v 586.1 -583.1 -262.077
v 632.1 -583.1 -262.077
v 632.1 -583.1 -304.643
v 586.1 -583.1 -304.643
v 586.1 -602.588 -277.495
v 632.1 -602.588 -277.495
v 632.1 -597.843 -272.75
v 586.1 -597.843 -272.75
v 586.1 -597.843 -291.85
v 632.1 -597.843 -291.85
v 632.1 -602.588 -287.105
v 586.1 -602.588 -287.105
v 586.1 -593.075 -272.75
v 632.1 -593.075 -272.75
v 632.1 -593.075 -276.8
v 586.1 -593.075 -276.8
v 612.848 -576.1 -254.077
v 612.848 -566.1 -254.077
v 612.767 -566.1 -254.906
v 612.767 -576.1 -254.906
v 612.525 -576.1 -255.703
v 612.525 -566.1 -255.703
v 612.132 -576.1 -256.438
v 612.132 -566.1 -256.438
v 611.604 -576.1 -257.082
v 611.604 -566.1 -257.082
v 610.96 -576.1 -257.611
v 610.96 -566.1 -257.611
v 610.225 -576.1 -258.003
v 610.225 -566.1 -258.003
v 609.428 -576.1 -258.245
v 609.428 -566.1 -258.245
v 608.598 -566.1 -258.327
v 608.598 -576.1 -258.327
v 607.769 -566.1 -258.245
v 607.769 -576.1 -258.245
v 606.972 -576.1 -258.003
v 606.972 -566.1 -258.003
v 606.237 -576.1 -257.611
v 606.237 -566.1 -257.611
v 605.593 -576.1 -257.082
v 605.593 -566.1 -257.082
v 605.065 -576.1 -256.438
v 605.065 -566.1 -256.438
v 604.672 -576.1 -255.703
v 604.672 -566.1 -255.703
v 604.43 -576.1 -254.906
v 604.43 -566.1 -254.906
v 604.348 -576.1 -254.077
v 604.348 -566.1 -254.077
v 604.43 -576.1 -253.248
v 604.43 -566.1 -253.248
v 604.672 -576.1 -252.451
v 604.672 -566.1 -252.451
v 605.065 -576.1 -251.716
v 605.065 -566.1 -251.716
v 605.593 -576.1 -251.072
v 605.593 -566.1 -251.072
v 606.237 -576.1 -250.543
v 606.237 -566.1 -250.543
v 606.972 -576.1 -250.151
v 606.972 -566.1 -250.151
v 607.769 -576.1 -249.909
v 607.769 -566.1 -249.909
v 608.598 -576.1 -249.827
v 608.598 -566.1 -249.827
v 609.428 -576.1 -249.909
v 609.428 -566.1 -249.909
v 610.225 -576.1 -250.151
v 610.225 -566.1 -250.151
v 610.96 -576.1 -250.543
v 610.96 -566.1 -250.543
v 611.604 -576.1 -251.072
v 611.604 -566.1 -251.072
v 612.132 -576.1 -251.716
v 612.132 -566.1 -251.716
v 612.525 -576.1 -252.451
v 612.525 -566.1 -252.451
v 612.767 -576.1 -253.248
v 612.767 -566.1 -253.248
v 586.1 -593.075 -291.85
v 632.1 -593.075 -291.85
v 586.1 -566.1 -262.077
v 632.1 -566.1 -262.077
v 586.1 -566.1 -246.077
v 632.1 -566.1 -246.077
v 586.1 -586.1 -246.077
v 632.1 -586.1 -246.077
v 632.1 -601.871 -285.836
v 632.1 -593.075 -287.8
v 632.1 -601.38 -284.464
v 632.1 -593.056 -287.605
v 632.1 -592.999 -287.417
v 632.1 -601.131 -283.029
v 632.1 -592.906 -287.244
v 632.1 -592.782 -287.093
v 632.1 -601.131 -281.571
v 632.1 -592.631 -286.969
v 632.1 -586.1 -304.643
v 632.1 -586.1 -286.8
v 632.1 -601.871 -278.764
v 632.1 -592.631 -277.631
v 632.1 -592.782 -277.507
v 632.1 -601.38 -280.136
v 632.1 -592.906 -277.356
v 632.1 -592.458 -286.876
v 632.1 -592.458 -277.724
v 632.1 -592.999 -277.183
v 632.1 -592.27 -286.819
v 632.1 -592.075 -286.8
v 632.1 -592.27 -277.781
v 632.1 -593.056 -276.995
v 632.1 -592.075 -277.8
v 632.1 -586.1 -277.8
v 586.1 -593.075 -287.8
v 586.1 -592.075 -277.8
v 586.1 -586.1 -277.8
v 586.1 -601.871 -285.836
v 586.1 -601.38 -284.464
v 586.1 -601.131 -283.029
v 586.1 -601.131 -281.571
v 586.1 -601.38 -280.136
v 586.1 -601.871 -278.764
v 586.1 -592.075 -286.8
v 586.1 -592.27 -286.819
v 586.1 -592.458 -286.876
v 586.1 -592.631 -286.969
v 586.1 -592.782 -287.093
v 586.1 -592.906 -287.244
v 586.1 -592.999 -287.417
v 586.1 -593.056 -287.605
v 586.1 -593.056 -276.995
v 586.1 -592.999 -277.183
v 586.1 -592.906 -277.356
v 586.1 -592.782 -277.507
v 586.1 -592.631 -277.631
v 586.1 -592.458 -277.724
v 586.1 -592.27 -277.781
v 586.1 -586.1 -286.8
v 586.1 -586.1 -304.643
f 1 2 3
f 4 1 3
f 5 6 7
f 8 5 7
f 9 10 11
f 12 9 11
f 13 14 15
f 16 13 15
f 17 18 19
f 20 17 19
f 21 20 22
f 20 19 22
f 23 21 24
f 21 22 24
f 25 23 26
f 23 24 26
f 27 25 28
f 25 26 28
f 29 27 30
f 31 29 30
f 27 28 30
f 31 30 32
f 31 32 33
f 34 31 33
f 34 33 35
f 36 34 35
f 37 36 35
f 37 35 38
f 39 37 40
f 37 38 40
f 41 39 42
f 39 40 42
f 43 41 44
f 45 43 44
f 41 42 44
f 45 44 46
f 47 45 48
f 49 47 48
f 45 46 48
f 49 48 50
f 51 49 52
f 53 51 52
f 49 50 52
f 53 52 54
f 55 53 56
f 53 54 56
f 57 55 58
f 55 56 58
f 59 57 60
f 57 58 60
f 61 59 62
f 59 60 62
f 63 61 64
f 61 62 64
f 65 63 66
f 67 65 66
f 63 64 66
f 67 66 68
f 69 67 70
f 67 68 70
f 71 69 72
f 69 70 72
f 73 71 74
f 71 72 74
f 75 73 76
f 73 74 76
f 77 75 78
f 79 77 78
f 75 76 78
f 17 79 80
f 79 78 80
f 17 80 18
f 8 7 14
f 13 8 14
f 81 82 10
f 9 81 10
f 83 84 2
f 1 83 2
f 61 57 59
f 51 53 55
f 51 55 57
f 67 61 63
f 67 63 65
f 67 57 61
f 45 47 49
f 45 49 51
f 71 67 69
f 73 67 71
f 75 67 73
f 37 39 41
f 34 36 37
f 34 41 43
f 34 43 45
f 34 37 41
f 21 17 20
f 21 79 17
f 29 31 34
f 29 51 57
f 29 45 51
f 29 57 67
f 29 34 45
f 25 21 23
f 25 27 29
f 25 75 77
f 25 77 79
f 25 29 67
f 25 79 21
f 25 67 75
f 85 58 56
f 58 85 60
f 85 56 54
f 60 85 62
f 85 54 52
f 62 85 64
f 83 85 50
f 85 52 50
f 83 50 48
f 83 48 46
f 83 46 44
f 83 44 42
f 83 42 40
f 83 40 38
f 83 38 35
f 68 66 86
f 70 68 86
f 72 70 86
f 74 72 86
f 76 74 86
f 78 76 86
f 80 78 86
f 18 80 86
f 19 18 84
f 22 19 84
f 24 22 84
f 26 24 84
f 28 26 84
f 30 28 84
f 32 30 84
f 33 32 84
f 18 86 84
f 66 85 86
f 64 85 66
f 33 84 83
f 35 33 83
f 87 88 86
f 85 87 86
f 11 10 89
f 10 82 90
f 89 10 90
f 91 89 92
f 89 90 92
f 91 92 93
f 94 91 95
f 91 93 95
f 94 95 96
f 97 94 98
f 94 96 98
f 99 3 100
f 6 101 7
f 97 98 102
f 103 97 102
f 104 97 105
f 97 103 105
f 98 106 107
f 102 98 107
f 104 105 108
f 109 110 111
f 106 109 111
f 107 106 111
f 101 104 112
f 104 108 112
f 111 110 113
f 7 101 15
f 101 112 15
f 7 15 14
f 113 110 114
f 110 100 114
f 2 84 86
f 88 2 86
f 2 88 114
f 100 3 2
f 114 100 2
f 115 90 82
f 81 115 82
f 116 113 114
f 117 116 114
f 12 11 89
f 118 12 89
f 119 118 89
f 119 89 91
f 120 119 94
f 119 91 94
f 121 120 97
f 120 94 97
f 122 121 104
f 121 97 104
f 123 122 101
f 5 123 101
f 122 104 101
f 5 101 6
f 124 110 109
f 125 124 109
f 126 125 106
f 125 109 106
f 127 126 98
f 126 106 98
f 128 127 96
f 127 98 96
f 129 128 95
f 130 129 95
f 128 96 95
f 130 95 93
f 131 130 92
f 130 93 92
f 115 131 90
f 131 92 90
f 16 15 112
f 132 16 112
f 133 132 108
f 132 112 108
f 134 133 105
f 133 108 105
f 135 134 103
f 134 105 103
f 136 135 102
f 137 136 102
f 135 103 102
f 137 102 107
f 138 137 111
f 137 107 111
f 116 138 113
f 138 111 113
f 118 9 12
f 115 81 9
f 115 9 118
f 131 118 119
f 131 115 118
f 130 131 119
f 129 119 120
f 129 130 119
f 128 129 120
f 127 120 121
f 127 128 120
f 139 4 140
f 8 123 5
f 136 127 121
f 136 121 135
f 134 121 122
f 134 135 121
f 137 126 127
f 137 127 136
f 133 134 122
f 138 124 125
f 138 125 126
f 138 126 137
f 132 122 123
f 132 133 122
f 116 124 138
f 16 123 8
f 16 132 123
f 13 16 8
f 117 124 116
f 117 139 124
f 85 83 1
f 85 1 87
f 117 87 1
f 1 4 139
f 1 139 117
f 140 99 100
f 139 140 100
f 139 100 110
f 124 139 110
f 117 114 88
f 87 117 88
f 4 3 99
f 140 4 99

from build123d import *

# Parameters (mm, degrees)
BOSS_EXTRUDE1_DEPTH = 46
SKETCH2_R           = 4.25
CUT_EXTRUDE1_DEPTH  = 10


with BuildPart() as part:
    # Sketch1 → Boss-Extrude1 (new body)
    with BuildSketch(Plane(origin=(632.1, 0, 0), x_dir=(0, 0, -1), z_dir=(1, 0, 0))):
        with BuildLine():
            Line((277.8, -589.1), (277.8, -586.1))
            Line((277.8, -586.1), (246.077000521, -586.1))
            Line((246.077000521, -586.1), (246.077000521, -566.1))
            Line((246.077000521, -566.1), (262.077000521, -566.1))
            Line((262.077000521, -566.1), (262.077000521, -583.1))
            Line((262.077000521, -583.1), (304.643123208, -583.1))
            Line((304.643123208, -583.1), (304.643123208, -586.1))
            Line((304.643123208, -586.1), (286.8, -586.1))
            Line((286.8, -586.1), (286.8, -589.1))
            Line((286.8, -589.1), (286.8, -592.075))
            ThreePointArc((286.8, -592.075), (287.092893219, -592.782106781), (287.8, -593.075))
            Line((287.8, -593.075), (291.85, -593.075))
            Line((291.85, -593.075), (291.85, -597.842893219))
            Line((291.85, -597.842893219), (287.104675609, -602.58821761))
            ThreePointArc((287.104675609, -602.58821761), (282.3, -601.1), (277.495324391, -602.58821761))
            Line((277.495324391, -602.58821761), (272.75, -597.842893219))
            Line((272.75, -597.842893219), (272.75, -593.075))
            Line((272.75, -593.075), (276.8, -593.075))
            ThreePointArc((276.8, -593.075), (277.507106781, -592.782106781), (277.8, -592.075))
            Line((277.8, -592.075), (277.8, -589.1))
        make_face()
    extrude(amount=-BOSS_EXTRUDE1_DEPTH)

    # Sketch2 → Cut-Extrude1 (cut)
    with BuildSketch(Plane(origin=(0, -566.1, 0), x_dir=(1, 0, 0), z_dir=(0, 1, 0))):
        with Locations((608.598456538, 254.077000521)):
            Circle(SKETCH2_R)
    extrude(amount=-CUT_EXTRUDE1_DEPTH, mode=Mode.SUBTRACT)


solid = part.part
